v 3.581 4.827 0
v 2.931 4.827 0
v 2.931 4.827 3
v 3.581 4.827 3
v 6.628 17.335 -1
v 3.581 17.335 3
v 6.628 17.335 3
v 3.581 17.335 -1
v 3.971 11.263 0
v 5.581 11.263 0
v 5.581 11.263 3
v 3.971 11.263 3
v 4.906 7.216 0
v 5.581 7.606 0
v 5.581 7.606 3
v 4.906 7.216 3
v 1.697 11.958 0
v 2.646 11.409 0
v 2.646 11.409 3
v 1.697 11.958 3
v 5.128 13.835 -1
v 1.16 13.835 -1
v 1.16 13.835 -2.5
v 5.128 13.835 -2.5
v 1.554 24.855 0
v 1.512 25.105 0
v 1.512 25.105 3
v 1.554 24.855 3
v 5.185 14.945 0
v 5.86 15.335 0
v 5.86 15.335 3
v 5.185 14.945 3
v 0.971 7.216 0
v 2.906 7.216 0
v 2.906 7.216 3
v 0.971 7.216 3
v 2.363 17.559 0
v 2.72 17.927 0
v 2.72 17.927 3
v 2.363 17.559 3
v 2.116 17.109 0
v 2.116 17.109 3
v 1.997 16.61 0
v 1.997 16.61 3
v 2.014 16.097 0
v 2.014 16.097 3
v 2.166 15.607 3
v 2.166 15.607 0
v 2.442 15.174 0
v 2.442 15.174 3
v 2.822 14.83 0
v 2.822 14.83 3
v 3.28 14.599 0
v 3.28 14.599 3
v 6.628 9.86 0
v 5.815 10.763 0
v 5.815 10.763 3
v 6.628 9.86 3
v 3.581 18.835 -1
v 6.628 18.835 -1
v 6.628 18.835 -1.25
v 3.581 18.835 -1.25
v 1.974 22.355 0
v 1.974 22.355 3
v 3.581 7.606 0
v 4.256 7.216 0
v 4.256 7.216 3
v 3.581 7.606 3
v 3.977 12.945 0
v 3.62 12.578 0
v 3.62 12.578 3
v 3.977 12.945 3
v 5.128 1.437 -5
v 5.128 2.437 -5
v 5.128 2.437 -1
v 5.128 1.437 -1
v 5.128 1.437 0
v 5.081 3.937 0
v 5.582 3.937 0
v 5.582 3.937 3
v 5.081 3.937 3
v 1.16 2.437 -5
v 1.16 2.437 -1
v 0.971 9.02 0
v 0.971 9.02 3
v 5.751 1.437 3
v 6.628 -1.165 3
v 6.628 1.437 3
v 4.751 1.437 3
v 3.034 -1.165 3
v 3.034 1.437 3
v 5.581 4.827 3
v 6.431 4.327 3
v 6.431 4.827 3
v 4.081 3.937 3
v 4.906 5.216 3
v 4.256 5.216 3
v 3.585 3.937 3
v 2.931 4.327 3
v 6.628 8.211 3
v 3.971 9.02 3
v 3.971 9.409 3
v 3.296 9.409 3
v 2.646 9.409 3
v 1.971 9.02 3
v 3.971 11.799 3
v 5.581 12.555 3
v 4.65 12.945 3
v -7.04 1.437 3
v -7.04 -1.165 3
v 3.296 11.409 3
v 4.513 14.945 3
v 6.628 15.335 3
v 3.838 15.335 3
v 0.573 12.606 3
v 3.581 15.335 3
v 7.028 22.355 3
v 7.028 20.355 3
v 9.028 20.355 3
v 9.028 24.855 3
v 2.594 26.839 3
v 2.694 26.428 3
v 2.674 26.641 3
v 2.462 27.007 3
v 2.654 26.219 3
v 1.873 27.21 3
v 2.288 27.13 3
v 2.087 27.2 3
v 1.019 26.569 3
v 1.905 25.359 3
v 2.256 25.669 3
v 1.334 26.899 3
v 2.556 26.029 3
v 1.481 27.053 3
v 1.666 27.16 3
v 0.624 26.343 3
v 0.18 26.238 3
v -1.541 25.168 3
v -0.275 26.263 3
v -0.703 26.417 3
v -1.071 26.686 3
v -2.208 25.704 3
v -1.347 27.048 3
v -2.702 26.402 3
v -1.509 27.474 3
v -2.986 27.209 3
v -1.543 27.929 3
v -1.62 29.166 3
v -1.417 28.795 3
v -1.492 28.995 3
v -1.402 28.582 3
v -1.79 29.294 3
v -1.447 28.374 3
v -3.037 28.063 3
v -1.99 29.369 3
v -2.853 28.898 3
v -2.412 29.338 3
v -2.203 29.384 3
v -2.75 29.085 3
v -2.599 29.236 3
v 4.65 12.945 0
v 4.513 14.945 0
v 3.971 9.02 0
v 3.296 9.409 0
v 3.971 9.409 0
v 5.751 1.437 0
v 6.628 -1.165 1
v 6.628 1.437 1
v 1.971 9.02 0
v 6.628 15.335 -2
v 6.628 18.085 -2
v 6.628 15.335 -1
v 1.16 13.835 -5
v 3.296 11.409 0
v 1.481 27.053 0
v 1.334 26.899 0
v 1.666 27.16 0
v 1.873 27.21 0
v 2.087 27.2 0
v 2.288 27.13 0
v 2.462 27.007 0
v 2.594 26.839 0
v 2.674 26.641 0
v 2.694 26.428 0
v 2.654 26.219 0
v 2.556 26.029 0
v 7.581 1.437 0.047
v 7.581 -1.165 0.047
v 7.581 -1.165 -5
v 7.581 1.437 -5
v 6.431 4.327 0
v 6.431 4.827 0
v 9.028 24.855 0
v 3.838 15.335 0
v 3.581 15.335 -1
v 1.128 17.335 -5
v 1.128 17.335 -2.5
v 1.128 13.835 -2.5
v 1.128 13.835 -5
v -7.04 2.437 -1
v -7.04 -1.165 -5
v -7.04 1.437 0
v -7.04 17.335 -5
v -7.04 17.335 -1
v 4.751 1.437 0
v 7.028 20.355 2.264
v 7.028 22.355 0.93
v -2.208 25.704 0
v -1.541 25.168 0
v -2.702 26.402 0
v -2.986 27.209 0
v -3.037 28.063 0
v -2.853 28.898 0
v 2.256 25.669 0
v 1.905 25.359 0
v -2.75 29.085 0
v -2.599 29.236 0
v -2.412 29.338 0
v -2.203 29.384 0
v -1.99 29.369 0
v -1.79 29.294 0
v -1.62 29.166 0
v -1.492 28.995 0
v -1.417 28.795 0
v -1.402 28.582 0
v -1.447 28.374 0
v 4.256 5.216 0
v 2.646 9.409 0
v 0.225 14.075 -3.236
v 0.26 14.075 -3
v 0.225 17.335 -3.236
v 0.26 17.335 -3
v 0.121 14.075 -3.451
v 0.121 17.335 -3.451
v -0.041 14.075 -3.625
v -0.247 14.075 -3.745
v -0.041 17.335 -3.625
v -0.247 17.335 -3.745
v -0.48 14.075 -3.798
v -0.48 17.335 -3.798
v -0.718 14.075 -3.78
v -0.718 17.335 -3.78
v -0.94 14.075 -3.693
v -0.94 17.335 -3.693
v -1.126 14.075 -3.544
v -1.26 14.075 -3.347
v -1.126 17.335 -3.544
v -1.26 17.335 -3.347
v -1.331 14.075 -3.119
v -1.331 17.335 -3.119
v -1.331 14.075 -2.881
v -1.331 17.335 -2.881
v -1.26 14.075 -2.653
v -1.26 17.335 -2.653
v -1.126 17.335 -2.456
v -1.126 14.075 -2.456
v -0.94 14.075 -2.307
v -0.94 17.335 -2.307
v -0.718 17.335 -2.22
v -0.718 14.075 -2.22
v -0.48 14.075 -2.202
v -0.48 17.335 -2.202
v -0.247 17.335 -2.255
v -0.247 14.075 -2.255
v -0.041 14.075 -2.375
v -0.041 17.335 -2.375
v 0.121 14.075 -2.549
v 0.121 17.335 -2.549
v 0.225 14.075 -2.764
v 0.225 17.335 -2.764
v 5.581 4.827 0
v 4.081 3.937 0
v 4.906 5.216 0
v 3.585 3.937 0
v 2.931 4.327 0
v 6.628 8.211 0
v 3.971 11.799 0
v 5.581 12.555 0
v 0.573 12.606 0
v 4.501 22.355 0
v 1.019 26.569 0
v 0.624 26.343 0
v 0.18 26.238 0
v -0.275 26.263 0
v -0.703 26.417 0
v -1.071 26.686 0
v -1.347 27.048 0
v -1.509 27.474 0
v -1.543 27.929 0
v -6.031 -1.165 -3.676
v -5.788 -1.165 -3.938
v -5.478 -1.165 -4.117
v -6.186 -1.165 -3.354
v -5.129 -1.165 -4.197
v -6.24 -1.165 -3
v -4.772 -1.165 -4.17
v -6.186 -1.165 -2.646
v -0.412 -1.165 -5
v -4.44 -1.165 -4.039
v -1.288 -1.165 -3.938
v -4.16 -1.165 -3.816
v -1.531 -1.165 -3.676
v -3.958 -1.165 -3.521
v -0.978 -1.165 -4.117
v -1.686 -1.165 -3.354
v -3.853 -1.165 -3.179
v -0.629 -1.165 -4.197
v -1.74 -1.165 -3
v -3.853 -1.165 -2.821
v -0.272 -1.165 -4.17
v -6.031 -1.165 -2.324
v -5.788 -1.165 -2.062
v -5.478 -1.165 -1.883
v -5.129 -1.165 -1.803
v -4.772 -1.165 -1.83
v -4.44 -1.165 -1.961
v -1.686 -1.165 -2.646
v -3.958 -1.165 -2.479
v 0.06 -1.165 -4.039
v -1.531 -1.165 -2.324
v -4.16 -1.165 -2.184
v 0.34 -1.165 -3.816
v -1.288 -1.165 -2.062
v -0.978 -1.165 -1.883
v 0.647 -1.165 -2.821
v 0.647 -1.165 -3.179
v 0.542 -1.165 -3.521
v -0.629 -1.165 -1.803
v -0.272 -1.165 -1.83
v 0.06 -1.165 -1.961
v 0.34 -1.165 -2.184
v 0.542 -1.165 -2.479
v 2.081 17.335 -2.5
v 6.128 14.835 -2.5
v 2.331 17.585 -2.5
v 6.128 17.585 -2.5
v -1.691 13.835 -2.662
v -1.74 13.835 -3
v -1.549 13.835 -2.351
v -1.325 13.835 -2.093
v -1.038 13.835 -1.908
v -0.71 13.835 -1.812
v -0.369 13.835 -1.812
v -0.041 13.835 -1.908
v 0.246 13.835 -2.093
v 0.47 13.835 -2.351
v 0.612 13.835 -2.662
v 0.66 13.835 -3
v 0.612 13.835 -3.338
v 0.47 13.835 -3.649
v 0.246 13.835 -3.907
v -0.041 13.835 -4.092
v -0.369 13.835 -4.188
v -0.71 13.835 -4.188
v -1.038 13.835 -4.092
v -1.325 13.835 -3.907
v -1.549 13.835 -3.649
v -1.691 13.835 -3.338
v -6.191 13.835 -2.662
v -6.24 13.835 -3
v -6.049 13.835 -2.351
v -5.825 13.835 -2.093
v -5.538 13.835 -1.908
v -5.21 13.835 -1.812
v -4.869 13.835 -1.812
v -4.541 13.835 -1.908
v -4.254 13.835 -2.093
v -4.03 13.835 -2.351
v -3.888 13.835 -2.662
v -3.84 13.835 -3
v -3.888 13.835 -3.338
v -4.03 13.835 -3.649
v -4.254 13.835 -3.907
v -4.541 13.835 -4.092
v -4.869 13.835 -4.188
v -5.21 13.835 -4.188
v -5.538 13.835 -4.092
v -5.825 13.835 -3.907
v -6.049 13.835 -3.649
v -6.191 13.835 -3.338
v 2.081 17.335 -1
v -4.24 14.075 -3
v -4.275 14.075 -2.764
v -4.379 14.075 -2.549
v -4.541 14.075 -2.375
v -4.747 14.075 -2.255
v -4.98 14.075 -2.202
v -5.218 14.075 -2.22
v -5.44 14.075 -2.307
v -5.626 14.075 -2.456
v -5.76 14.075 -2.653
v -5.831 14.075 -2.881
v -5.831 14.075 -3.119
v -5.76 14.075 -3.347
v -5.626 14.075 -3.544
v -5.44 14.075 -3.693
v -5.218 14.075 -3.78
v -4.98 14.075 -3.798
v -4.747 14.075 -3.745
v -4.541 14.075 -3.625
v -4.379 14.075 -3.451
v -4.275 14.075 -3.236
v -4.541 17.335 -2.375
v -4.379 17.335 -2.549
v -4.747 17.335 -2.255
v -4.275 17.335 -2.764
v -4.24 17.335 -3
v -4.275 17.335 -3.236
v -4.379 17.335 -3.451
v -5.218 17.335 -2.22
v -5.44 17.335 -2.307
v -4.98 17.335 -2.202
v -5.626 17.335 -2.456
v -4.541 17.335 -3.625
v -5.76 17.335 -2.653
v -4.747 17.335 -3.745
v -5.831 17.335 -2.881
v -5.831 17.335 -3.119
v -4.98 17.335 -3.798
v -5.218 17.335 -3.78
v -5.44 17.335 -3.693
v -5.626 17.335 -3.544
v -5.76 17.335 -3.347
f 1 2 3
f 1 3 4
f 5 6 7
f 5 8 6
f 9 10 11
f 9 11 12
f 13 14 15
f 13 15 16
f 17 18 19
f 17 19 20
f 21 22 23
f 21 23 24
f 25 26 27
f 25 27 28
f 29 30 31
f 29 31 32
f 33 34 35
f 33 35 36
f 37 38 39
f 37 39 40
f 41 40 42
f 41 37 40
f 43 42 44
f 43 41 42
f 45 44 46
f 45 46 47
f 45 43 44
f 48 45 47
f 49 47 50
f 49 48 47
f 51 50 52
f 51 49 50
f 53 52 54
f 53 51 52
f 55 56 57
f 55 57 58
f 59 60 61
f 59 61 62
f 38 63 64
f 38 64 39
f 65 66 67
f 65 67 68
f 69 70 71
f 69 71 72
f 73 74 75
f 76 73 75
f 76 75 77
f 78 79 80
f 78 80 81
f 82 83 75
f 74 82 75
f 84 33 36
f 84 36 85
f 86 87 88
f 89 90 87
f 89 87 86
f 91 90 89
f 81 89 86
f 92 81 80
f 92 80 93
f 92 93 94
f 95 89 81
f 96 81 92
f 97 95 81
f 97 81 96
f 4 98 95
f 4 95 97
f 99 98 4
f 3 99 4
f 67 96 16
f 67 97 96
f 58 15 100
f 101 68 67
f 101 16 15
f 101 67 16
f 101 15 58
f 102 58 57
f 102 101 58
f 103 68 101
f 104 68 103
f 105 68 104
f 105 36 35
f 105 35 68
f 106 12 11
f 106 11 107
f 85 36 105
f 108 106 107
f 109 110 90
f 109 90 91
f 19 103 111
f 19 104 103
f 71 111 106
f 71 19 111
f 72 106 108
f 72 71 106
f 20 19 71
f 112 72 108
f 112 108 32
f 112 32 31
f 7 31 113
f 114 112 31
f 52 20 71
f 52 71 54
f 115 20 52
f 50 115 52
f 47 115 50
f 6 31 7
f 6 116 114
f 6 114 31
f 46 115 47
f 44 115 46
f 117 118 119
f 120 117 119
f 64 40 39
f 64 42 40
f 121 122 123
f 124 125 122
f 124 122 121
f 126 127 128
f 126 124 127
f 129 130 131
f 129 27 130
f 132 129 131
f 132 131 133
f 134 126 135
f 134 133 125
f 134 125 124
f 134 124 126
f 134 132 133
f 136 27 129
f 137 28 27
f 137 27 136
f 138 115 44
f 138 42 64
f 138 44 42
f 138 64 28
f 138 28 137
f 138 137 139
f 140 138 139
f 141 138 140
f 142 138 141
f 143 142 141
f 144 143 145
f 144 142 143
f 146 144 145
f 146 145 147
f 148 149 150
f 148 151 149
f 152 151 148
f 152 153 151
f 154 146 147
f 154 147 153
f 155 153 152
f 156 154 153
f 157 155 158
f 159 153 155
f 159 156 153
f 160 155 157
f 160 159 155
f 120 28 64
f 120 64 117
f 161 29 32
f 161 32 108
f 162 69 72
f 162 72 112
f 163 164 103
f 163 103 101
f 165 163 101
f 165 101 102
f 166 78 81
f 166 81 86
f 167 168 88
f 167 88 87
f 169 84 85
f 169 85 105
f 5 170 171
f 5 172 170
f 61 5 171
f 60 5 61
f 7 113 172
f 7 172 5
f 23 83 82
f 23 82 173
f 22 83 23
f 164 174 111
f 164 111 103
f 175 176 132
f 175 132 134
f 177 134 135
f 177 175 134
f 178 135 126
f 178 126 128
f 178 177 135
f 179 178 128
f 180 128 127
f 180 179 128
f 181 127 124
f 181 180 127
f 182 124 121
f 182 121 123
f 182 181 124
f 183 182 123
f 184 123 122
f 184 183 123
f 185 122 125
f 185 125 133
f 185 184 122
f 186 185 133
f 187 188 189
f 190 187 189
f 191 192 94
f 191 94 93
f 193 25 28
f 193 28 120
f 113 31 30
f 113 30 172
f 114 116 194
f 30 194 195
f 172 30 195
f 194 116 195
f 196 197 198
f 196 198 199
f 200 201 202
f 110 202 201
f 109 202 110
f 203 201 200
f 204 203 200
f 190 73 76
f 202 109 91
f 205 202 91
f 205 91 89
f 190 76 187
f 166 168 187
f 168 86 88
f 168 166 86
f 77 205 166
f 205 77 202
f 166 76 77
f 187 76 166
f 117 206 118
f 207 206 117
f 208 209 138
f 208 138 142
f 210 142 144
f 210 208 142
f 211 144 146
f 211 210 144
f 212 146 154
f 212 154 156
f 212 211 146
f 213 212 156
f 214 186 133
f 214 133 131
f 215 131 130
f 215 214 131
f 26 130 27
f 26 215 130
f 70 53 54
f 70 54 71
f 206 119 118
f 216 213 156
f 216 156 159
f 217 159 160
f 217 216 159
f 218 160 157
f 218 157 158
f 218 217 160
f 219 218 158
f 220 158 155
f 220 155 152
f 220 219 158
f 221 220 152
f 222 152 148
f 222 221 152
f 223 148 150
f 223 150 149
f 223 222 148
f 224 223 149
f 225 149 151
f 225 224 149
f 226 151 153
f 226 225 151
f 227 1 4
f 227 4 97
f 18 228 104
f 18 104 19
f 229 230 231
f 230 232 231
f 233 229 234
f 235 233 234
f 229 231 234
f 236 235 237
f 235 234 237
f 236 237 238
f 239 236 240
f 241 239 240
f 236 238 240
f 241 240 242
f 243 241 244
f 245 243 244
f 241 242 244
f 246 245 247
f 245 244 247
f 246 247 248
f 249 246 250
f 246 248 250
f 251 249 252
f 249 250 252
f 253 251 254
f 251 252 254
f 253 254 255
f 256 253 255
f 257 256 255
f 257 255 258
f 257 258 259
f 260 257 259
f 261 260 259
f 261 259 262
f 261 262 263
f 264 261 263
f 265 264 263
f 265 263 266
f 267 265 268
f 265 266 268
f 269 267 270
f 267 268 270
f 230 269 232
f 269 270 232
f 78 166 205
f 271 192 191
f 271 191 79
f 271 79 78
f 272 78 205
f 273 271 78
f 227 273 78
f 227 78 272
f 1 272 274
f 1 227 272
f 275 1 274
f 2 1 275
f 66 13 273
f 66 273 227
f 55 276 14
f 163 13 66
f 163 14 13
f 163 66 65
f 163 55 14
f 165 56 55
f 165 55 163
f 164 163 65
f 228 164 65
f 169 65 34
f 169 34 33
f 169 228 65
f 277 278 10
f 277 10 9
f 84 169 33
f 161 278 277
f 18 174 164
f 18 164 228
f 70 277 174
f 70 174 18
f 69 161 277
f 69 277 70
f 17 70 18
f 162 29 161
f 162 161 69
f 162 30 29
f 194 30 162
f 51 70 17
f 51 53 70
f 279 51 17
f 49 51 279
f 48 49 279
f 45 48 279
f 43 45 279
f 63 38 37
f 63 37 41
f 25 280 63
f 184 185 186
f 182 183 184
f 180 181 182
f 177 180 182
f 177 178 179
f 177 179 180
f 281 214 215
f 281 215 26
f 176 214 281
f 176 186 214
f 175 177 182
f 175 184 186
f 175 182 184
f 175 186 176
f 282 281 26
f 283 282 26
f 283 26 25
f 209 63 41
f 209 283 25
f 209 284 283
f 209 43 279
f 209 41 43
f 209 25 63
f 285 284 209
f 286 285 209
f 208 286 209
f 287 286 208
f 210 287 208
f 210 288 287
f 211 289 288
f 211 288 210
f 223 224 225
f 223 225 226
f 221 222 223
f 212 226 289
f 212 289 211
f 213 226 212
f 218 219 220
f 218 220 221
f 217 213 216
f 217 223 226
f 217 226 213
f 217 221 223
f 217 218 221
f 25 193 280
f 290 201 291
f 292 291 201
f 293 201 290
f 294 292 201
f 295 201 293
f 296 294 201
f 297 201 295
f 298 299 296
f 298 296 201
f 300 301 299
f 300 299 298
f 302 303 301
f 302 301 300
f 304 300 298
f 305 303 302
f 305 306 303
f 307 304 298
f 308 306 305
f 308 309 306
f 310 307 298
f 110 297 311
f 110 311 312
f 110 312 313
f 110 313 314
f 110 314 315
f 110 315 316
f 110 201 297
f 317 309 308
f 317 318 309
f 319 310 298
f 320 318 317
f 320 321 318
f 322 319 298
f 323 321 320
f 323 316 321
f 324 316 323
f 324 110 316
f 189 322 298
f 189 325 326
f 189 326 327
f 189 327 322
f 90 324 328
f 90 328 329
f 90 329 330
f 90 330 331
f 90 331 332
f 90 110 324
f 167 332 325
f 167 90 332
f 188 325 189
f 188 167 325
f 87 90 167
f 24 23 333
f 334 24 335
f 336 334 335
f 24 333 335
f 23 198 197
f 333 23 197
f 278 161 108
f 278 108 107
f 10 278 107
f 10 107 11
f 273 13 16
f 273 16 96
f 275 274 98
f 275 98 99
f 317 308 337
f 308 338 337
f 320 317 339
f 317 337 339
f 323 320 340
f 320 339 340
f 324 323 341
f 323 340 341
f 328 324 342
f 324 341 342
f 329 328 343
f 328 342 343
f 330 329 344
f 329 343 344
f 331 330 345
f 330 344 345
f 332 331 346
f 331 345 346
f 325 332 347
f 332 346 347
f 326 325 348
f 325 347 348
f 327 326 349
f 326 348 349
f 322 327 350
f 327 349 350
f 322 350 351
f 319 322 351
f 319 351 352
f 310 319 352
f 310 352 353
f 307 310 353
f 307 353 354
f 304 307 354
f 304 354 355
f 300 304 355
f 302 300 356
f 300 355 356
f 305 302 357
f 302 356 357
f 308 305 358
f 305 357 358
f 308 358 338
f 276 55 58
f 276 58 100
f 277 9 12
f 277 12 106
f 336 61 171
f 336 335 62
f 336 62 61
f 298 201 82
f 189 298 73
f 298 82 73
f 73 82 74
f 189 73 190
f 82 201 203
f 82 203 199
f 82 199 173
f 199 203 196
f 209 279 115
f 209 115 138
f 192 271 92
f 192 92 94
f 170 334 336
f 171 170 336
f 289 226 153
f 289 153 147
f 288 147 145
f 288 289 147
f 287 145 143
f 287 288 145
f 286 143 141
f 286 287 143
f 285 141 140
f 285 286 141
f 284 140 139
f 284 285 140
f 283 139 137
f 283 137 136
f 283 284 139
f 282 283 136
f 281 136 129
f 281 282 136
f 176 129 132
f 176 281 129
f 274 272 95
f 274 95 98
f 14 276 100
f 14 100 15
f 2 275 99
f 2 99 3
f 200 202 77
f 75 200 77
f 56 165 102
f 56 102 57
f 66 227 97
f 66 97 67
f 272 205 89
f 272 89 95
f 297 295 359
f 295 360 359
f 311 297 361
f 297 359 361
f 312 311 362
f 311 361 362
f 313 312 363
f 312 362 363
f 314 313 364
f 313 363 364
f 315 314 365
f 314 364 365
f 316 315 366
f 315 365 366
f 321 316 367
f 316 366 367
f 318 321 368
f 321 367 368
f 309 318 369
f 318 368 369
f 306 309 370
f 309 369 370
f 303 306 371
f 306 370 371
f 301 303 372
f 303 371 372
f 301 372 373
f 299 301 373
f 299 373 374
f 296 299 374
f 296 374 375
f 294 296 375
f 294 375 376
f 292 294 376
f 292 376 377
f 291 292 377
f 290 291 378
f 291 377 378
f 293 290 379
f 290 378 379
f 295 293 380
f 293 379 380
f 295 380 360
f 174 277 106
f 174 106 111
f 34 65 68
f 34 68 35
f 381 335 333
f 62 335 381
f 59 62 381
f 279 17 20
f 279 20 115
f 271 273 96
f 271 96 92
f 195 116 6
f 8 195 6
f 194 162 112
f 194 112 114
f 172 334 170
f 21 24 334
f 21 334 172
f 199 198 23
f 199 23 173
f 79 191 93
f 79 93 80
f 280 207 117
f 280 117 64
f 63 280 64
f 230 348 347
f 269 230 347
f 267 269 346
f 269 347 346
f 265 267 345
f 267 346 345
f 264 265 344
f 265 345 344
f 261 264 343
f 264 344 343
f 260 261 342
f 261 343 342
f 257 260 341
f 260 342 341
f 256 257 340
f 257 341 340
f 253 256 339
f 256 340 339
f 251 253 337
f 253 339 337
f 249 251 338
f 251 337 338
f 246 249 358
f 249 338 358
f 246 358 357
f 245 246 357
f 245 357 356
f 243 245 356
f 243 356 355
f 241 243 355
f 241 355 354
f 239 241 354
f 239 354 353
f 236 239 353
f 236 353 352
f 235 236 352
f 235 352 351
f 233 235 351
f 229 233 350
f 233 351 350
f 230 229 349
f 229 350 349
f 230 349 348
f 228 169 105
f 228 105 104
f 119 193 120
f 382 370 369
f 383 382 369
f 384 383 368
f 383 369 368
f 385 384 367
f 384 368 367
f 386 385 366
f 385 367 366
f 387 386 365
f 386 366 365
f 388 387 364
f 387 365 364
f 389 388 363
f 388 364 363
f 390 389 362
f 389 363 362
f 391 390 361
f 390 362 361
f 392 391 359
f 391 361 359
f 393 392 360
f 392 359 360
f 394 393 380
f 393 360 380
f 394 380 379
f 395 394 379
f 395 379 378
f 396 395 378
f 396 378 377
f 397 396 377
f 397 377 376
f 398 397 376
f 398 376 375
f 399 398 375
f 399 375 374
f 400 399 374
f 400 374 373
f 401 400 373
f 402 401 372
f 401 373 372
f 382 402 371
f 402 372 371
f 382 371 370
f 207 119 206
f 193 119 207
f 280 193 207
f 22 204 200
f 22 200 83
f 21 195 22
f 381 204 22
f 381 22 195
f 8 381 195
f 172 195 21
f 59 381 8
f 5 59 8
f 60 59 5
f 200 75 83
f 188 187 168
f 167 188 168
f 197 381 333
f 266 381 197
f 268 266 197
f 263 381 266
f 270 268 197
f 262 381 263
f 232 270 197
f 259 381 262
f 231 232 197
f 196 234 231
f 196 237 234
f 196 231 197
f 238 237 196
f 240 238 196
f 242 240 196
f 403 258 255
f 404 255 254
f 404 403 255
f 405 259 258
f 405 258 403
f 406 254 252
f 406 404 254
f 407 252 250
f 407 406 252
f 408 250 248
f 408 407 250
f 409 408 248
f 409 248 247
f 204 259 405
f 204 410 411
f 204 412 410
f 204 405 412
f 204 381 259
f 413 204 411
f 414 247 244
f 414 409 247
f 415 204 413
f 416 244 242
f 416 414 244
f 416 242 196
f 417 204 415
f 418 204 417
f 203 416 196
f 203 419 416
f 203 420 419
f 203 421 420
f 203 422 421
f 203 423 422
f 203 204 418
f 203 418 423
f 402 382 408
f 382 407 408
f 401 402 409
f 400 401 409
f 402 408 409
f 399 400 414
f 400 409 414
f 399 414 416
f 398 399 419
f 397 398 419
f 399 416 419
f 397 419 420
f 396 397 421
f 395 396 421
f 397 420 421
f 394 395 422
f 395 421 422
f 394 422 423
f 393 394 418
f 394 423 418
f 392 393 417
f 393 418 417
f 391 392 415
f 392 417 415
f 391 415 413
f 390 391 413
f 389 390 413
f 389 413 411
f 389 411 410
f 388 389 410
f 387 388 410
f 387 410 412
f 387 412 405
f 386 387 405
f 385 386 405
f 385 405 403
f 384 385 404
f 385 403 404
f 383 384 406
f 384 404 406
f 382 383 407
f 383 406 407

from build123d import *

# Parameters (mm, degrees)
BOSS_SWITCH_BODY_DEPTH                    = 3
SKETCH1_W                                 = 4
SKETCH1_H                                 = 3.5
BOSS_FLANGE_WIDTH_DEPTH                   = 5
BOSS_FLANGE_HEIGHT_REACH                  = 35.863
SKETCH2_W                                 = 4
SKETCH2_H                                 = 2
SKETCH2_W_2                               = 8
SKETCH2_H_2                               = 2.602328973
CUT_UP_TO_DOWN_DERAILLEUR_CLEARANCE_REACH = 21.462
SKETCH10_W                                = 2.453096586
SKETCH10_H                                = 3
SKETCH17_W                                = 12.1675
SKETCH17_H                                = 4
BOSS_FLANGE_SUPPORT_DEPTH                 = 13.897671027
TAP_DRILL_FOR_M2X0_4_TAP1_D               = 1.6
M2_CLEARANCE_HOLE2_D                      = 2.4
M2_CLEARANCE_HOLE2_DEPTH                  = 15
M2_CLEARANCE_HOLE2_TIP                    = 0.721032743
CHAMFER_FLANGE_SUPPORT_SIZE               = 1.5
CHAMFER_FLANGE_SUPPORT_2_SIZE             = 1.5
CHAMFER_FLANGE_SUPPORT_3_SIZE             = 1
SKETCH23_W                                = 3.9675
SKETCH23_H                                = 11.397671027
CUT_GAP_FOR_PRINTING_DEPTH                = 32.000499688
SKETCH25_W                                = 0.953096586
SKETCH25_H                                = 3.5
CUT_DERAILLEUR_CLEARANCE_DEPTH            = 32.145320369
CHAMFER8_SIZE                             = 1
CUT_UP_TO_DOWN_CANTILEVER_SLOPE_REACH     = 31.869
SKETCH26_W                                = 12.477246204
SKETCH26_H                                = 5.771077126
CUT_WIDE_DERAILLEUR_CLEARANCE_DEPTH       = 33.195879702
CUT_WIDE_DERAILLEUR_CLEARANCE_DEPTH_BACK  = 4
SKETCH27_W                                = 2.5
SKETCH27_H                                = 5.000000046
CHAMFER9_SIZE                             = 1.25
SKETCH28_W                                = 3.046903414
SKETCH28_H                                = 1.5
CUT_EXTRUDE1_DEPTH                        = 1


# Some blends are built 0.0001 mm under size
with BuildPart() as part:
    # Sketch-SwitchBossUp → Boss-Switch Body (new body)
    with BuildSketch(Plane.XY):
        with BuildLine():
            Line((5.581091201, 12.55524379), (5.581100766, 11.263016279))
            Line((5.581100766, 11.263016279), (3.971265023, 11.263016279))
            Line((3.971265023, 11.263016279), (3.97126394, 11.79911022))
            Line((3.97126394, 11.79911022), (3.296271341, 11.409403061))
            Line((3.296271341, 11.409403061), (3.296271341, 9.409403061))
            Line((3.296271341, 9.409403061), (3.971278743, 9.019687356))
            Line((3.971278743, 9.019687356), (3.971278743, 9.409408058))
            Line((3.971278743, 9.409408058), (5.815189336, 10.763016279))
            Line((5.815189336, 10.763016279), (6.627976927, 9.860324207))
            Line((6.627976927, 9.860324207), (6.627976927, 8.210536505))
            Line((6.627976927, 8.210536505), (5.581127833, 7.606137899))
            Line((5.581127833, 7.606137899), (4.906138119, 7.216432406))
            Line((4.906138119, 7.216432406), (4.906138119, 5.216432406))
            Line((4.906138119, 5.216432406), (5.58114552, 4.826716701))
            Line((5.58114552, 4.826716701), (6.430577026, 4.826716701))
            Line((6.430577026, 4.826716701), (6.430577026, 4.326716701))
            Line((6.430577026, 4.326716701), (5.582379266, 3.937018274))
            Line((5.582379266, 3.937018274), (5.081138119, 3.937018274))
            Line((5.081138119, 3.937018274), (5.7510111, 1.437018274))
            Line((5.7510111, 1.437018274), (6.627976927, 1.437018274))
            Line((6.627976927, 1.437018274), (6.627976927, -1.165310699))
            Line((6.627976927, -1.165310699), (3.034464198, -1.165310699))
            Line((3.034464198, -1.165310699), (3.034464198, 1.437018274))
            Line((3.034464198, 1.437018274), (4.7510111, 1.437018274))
            Line((4.7510111, 1.437018274), (4.081138119, 3.937018274))
            Line((4.081138119, 3.937018274), (3.585032728, 3.937018274))
            Line((3.585032728, 3.937018274), (2.930577026, 4.326720436))
            Line((2.930577026, 4.326720436), (2.930577026, 4.826720436))
            Line((2.930577026, 4.826720436), (3.58114552, 4.826720436))
            Line((3.58114552, 4.826720436), (4.256138119, 5.216427595))
            Line((4.256138119, 5.216427595), (4.256138119, 7.216427595))
            Line((4.256138119, 7.216427595), (3.581130717, 7.6061433))
            Line((3.581130717, 7.6061433), (2.9061262, 7.216422599))
            Line((2.9061262, 7.216422599), (0.971281627, 7.216422599))
            Line((0.971281627, 7.216422599), (0.971281627, 9.019692757))
            Line((0.971281627, 9.019692757), (1.971281627, 9.019692757))
            Line((1.971281627, 9.019692757), (2.646271341, 9.40939825))
            Line((2.646271341, 9.40939825), (2.646271341, 11.40939825))
            Line((2.646271341, 11.40939825), (1.696557212, 11.957715958))
            Line((1.696557212, 11.957715958), (0.573317845, 12.60621851))
            Line((0.573317845, 12.60621851), (-1.541303694, 25.167805745))
            ThreePointArc((-1.541303694, 25.167805745), (-2.872284003, 26.795385437), (-2.852546321, 28.897797067))
            ThreePointArc((-2.852546321, 28.897797067), (-1.887813913, 29.338582026), (-1.447028953, 28.373849618))
            ThreePointArc((-1.447028953, 28.373849618), (-0.703448682, 26.416936722), (1.333779254, 26.898727173))
            ThreePointArc((1.333779254, 26.898727173), (2.379722745, 27.074801628), (2.555797201, 26.028858137))
            ThreePointArc((2.555797201, 26.028858137), (2.086504637, 25.507104397), (1.511513111, 25.104801997))
            Line((1.511513111, 25.104801997), (1.553598189, 24.854801997))
            Line((1.553598189, 24.854801997), (9.027976927, 24.854801997))
            Line((9.027976927, 24.854801997), (9.027976927, 22.354801997))
            Line((9.027976927, 22.354801997), (9.027976927, 20.354801997))
            Line((9.027976927, 20.354801997), (7.027976927, 20.354801997))
            Line((7.027976927, 20.354801997), (7.027976927, 22.354801997))
            Line((7.027976927, 22.354801997), (1.974448974, 22.354801997))
            Line((1.974448974, 22.354801997), (2.719778232, 17.927287042))
            ThreePointArc((2.719778232, 17.927287042), (2.013826204, 16.096957693), (3.280124137, 14.598637521))
            Line((3.280124137, 14.598637521), (3.620297651, 12.577888564))
            Line((3.620297651, 12.577888564), (3.976674365, 12.944956135))
            Line((3.976674365, 12.944956135), (4.512557947, 14.944960101))
            Line((4.512557947, 14.944960101), (3.837515632, 15.334689301))
            Line((3.837515632, 15.334689301), (3.581073513, 15.334689301))
            Line((3.581073513, 15.334689301), (3.581073513, 17.334689301))
            Line((3.581073513, 17.334689301), (5.725580434, 17.334689301))
            Line((5.725580434, 17.334689301), (6.627976927, 17.334689301))
            Line((6.627976927, 17.334689301), (6.627976927, 15.334689301))
            Line((6.627976927, 15.334689301), (5.860498075, 15.334689301))
            Line((5.860498075, 15.334689301), (5.185487464, 14.944965082))
            Line((5.185487464, 14.944965082), (4.649603883, 12.944961115))
            Line((4.649603883, 12.944961115), (5.581091201, 12.55524379))
        make_face()
    extrude(amount=BOSS_SWITCH_BODY_DEPTH)

    # Sketch1 → Boss-Flange Width (add)
    with BuildSketch(Plane(origin=(0, 0, 0), x_dir=(-1, 0, 0), z_dir=(0, 0, -1))):
        Polygon((-7.581073513, -1.165310699), (0.412170615, -1.165310699), (0.412170615, 1.437018274), (-3.034464198, 1.437018274), (-4.7510111, 1.437018274), (-5.7510111, 1.437018274), (-6.627976927, 1.437018274), (-7.581073513, 1.437018274), align=None)
        with Locations((-5.581073513, 17.084689301)):
            Rectangle(SKETCH1_W, SKETCH1_H)
    extrude(amount=BOSS_FLANGE_WIDTH_DEPTH)

    # Sketch2 → Boss-Flange Height (add, up to next)
    with BuildSketch(Plane(origin=(-7.039523073, 0, 0), x_dir=(0, 0, -1), z_dir=(1, 0, 0)), mode=Mode.PRIVATE) as boss_flange_height_sk1:
        with Locations((3, 16.334689301)):
            Rectangle(SKETCH2_W, SKETCH2_H)
    boss_flange_height_tool1 = extrude(boss_flange_height_sk1.sketch, amount=BOSS_FLANGE_HEIGHT_REACH, mode=Mode.PRIVATE) - part.part
    # Sketch2 → Boss-Flange Height (add, up to next)
    with BuildSketch(Plane(origin=(-7.039523073, 0, 0), x_dir=(0, 0, -1), z_dir=(1, 0, 0)), mode=Mode.PRIVATE) as boss_flange_height_sk2:
        with Locations((1, 0.135853787)):
            Rectangle(SKETCH2_W_2, SKETCH2_H_2)
    boss_flange_height_tool2 = extrude(boss_flange_height_sk2.sketch, amount=BOSS_FLANGE_HEIGHT_REACH, mode=Mode.PRIVATE) - part.part
    add(boss_flange_height_tool1.solids().sort_by_distance((-7.039523, 16.334689, -3))[0])
    add(boss_flange_height_tool2.solids().sort_by_distance((-7.039523, 0.135854, -1))[0])

    # Sketch10 → Cut-Up-To-Down Derailleur Clearance (cut, up to next)
    with BuildSketch(Plane(origin=(0, 15.334689301, 0), x_dir=(1, 0, 0), z_dir=(0, 1, 0)), mode=Mode.PRIVATE) as cut_up_to_down_derailleur_clearance_sk1:
        with Locations((6.35452522, 3.5)):
            Rectangle(SKETCH10_W, SKETCH10_H)
    cut_up_to_down_derailleur_clearance_tool1 = extrude(cut_up_to_down_derailleur_clearance_sk1.sketch, amount=CUT_UP_TO_DOWN_DERAILLEUR_CLEARANCE_REACH, mode=Mode.PRIVATE) & part.part
    add(cut_up_to_down_derailleur_clearance_tool1.solids().sort_by_distance((6.354525, 15.334689, -3.5))[0], mode=Mode.SUBTRACT)

    # Sketch17 → Boss-Flange Support (add)
    with BuildSketch(Plane.XZ.offset(-15.334689301)):
        with Locations((-0.955773073, -3)):
            Rectangle(SKETCH17_W, SKETCH17_H)
    extrude(amount=BOSS_FLANGE_SUPPORT_DEPTH)

    # Tap Drill for M2x0.4 Tap1 (through all)
    with Locations(Plane(origin=(0, -1.165310699, 0), x_dir=(-1, 0, 0), z_dir=(0, -1, 0))):
        with Locations((5.039523073, 3), (0.539523073, 3)):
            Hole(TAP_DRILL_FOR_M2X0_4_TAP1_D / 2)

    # M2 Clearance Hole2
    with Locations(Plane.XZ.offset(1.165310699)):
        with Locations((-5.039523073, -3), (-0.539523073, -3)):
            Hole(M2_CLEARANCE_HOLE2_D / 2, depth=M2_CLEARANCE_HOLE2_DEPTH)
            with Locations((0, 0, -(M2_CLEARANCE_HOLE2_DEPTH + M2_CLEARANCE_HOLE2_TIP / 2))):  # 118° drill point
                Cone(0, M2_CLEARANCE_HOLE2_D / 2, M2_CLEARANCE_HOLE2_TIP, mode=Mode.SUBTRACT)

    # Chamfer-Flange Support
    chamfer_flange_support_edges = [part.edges().sort_by_distance(p)[0] for p in [
        (3.581073513, 17.334689301, -3),
    ]]
    chamfer(chamfer_flange_support_edges, length=CHAMFER_FLANGE_SUPPORT_SIZE - 0.0001)  # a hair under: the kernel refuses the full size

    # Chamfer-Flange Support 2
    chamfer_flange_support_2_edges = [part.edges().sort_by_distance(p)[0] for p in [
        (5.127976927, 17.084689301, -2),
        (5.127976927, 15.334689301, -1.5),
    ]]
    chamfer(chamfer_flange_support_2_edges, length=CHAMFER_FLANGE_SUPPORT_2_SIZE)

    # Chamfer-Flange Support 3
    chamfer_flange_support_3_edges = [part.edges().sort_by_distance(p)[0] for p in [
        (-0.955773073, 1.437018274, -1),
    ]]
    chamfer(chamfer_flange_support_3_edges, length=CHAMFER_FLANGE_SUPPORT_3_SIZE - 0.0001)  # a hair under: the kernel refuses the full size

    # Sketch23 → Cut-Gap for Printing (cut, through all)
    with BuildSketch(Plane.XY.offset(-1)):
        with Locations((3.144226927, 8.135853788)):
            Rectangle(SKETCH23_W, SKETCH23_H)
    extrude(amount=-CUT_GAP_FOR_PRINTING_DEPTH, mode=Mode.SUBTRACT)

    # Sketch25 → Cut-Derailleur Clearance (cut, through all)
    with BuildSketch(Plane.XY):
        with Locations((7.10452522, 17.084689301)):
            Rectangle(SKETCH25_W, SKETCH25_H)
    extrude(amount=-CUT_DERAILLEUR_CLEARANCE_DEPTH, mode=Mode.SUBTRACT)

    # Chamfer8
    # the kernel refuses this chamfer: 1 mm, written as the material it adds along each edge
    with BuildSketch(Plane(origin=(6.627976927, 1.437018274, 0), x_dir=(0.9996219169112968, 0, -0.027495876610586365), z_dir=(0, -1, 0))) as chamfer8_piece_1_section:
        Polygon((CHAMFER8_SIZE * 0.999621916911, CHAMFER8_SIZE * 0.0274958766106), (-CHAMFER8_SIZE * 0.0274958766106, CHAMFER8_SIZE * 0.999621916911), (0, 0), align=None)
    chamfer8_piece_1 = extrude(amount=2.602328973, mode=Mode.PRIVATE)
    chamfer8_piece_1 = split(chamfer8_piece_1, bisect_by=Plane(origin=(7.581073513, 0.135853788, 0.332375145), z_dir=(-1, 0, 0)), keep=Keep.TOP, mode=Mode.PRIVATE)
    add(chamfer8_piece_1)

    # Sketch26 → Cut-Up-to-Down Cantilever Slope (cut, up to next)
    with BuildSketch(Plane(origin=(-3.086642121, 5.589000146, 8.383500218), x_dir=(-0.9561404375276108, -0.1624764728289173, -0.24371470924337582), z_dir=(0.2929086269205964, -0.5303712883154423, -0.795556932473163)), mode=Mode.PRIVATE) as cut_up_to_down_cantilever_slope_sk1:
        with Locations((-13.791615152, 17.794906754)):
            Rectangle(SKETCH26_W, SKETCH26_H)
    cut_up_to_down_cantilever_slope_tool1 = extrude(cut_up_to_down_cantilever_slope_sk1.sketch, amount=CUT_UP_TO_DOWN_CANTILEVER_SLOPE_REACH, mode=Mode.PRIVATE) & part.part
    add(cut_up_to_down_cantilever_slope_tool1.solids().sort_by_distance((10.100079, 22.636071, 1.873881))[0], mode=Mode.SUBTRACT)

    # Sketch27 → Cut-Wide Derailleur Clearance (cut, two sides: drawn at the far end of the back side and taken through both)
    with BuildSketch(Plane(origin=(5.127976927, 0, 0), x_dir=(0, 0, -1), z_dir=(1, 0, 0)).offset(-CUT_WIDE_DERAILLEUR_CLEARANCE_DEPTH_BACK)):
        with Locations((3.75, 16.334689324)):
            Rectangle(SKETCH27_W, SKETCH27_H)
    extrude(amount=CUT_WIDE_DERAILLEUR_CLEARANCE_DEPTH + CUT_WIDE_DERAILLEUR_CLEARANCE_DEPTH_BACK, mode=Mode.SUBTRACT)

    # Chamfer9
    chamfer9_edges = [part.edges().sort_by_distance(p)[0] for p in [
        (4.85452522, 18.834689347, -2.5),
    ]]
    chamfer(chamfer9_edges, length=CHAMFER9_SIZE)

    # Sketch28 → Cut-Extrude1 (cut)
    with BuildSketch(Plane.XY.offset(-1)):
        with Locations((5.10452522, 18.084689301)):
            Rectangle(SKETCH28_W, SKETCH28_H)
    extrude(amount=CUT_EXTRUDE1_DEPTH, mode=Mode.SUBTRACT)


solid = part.part
